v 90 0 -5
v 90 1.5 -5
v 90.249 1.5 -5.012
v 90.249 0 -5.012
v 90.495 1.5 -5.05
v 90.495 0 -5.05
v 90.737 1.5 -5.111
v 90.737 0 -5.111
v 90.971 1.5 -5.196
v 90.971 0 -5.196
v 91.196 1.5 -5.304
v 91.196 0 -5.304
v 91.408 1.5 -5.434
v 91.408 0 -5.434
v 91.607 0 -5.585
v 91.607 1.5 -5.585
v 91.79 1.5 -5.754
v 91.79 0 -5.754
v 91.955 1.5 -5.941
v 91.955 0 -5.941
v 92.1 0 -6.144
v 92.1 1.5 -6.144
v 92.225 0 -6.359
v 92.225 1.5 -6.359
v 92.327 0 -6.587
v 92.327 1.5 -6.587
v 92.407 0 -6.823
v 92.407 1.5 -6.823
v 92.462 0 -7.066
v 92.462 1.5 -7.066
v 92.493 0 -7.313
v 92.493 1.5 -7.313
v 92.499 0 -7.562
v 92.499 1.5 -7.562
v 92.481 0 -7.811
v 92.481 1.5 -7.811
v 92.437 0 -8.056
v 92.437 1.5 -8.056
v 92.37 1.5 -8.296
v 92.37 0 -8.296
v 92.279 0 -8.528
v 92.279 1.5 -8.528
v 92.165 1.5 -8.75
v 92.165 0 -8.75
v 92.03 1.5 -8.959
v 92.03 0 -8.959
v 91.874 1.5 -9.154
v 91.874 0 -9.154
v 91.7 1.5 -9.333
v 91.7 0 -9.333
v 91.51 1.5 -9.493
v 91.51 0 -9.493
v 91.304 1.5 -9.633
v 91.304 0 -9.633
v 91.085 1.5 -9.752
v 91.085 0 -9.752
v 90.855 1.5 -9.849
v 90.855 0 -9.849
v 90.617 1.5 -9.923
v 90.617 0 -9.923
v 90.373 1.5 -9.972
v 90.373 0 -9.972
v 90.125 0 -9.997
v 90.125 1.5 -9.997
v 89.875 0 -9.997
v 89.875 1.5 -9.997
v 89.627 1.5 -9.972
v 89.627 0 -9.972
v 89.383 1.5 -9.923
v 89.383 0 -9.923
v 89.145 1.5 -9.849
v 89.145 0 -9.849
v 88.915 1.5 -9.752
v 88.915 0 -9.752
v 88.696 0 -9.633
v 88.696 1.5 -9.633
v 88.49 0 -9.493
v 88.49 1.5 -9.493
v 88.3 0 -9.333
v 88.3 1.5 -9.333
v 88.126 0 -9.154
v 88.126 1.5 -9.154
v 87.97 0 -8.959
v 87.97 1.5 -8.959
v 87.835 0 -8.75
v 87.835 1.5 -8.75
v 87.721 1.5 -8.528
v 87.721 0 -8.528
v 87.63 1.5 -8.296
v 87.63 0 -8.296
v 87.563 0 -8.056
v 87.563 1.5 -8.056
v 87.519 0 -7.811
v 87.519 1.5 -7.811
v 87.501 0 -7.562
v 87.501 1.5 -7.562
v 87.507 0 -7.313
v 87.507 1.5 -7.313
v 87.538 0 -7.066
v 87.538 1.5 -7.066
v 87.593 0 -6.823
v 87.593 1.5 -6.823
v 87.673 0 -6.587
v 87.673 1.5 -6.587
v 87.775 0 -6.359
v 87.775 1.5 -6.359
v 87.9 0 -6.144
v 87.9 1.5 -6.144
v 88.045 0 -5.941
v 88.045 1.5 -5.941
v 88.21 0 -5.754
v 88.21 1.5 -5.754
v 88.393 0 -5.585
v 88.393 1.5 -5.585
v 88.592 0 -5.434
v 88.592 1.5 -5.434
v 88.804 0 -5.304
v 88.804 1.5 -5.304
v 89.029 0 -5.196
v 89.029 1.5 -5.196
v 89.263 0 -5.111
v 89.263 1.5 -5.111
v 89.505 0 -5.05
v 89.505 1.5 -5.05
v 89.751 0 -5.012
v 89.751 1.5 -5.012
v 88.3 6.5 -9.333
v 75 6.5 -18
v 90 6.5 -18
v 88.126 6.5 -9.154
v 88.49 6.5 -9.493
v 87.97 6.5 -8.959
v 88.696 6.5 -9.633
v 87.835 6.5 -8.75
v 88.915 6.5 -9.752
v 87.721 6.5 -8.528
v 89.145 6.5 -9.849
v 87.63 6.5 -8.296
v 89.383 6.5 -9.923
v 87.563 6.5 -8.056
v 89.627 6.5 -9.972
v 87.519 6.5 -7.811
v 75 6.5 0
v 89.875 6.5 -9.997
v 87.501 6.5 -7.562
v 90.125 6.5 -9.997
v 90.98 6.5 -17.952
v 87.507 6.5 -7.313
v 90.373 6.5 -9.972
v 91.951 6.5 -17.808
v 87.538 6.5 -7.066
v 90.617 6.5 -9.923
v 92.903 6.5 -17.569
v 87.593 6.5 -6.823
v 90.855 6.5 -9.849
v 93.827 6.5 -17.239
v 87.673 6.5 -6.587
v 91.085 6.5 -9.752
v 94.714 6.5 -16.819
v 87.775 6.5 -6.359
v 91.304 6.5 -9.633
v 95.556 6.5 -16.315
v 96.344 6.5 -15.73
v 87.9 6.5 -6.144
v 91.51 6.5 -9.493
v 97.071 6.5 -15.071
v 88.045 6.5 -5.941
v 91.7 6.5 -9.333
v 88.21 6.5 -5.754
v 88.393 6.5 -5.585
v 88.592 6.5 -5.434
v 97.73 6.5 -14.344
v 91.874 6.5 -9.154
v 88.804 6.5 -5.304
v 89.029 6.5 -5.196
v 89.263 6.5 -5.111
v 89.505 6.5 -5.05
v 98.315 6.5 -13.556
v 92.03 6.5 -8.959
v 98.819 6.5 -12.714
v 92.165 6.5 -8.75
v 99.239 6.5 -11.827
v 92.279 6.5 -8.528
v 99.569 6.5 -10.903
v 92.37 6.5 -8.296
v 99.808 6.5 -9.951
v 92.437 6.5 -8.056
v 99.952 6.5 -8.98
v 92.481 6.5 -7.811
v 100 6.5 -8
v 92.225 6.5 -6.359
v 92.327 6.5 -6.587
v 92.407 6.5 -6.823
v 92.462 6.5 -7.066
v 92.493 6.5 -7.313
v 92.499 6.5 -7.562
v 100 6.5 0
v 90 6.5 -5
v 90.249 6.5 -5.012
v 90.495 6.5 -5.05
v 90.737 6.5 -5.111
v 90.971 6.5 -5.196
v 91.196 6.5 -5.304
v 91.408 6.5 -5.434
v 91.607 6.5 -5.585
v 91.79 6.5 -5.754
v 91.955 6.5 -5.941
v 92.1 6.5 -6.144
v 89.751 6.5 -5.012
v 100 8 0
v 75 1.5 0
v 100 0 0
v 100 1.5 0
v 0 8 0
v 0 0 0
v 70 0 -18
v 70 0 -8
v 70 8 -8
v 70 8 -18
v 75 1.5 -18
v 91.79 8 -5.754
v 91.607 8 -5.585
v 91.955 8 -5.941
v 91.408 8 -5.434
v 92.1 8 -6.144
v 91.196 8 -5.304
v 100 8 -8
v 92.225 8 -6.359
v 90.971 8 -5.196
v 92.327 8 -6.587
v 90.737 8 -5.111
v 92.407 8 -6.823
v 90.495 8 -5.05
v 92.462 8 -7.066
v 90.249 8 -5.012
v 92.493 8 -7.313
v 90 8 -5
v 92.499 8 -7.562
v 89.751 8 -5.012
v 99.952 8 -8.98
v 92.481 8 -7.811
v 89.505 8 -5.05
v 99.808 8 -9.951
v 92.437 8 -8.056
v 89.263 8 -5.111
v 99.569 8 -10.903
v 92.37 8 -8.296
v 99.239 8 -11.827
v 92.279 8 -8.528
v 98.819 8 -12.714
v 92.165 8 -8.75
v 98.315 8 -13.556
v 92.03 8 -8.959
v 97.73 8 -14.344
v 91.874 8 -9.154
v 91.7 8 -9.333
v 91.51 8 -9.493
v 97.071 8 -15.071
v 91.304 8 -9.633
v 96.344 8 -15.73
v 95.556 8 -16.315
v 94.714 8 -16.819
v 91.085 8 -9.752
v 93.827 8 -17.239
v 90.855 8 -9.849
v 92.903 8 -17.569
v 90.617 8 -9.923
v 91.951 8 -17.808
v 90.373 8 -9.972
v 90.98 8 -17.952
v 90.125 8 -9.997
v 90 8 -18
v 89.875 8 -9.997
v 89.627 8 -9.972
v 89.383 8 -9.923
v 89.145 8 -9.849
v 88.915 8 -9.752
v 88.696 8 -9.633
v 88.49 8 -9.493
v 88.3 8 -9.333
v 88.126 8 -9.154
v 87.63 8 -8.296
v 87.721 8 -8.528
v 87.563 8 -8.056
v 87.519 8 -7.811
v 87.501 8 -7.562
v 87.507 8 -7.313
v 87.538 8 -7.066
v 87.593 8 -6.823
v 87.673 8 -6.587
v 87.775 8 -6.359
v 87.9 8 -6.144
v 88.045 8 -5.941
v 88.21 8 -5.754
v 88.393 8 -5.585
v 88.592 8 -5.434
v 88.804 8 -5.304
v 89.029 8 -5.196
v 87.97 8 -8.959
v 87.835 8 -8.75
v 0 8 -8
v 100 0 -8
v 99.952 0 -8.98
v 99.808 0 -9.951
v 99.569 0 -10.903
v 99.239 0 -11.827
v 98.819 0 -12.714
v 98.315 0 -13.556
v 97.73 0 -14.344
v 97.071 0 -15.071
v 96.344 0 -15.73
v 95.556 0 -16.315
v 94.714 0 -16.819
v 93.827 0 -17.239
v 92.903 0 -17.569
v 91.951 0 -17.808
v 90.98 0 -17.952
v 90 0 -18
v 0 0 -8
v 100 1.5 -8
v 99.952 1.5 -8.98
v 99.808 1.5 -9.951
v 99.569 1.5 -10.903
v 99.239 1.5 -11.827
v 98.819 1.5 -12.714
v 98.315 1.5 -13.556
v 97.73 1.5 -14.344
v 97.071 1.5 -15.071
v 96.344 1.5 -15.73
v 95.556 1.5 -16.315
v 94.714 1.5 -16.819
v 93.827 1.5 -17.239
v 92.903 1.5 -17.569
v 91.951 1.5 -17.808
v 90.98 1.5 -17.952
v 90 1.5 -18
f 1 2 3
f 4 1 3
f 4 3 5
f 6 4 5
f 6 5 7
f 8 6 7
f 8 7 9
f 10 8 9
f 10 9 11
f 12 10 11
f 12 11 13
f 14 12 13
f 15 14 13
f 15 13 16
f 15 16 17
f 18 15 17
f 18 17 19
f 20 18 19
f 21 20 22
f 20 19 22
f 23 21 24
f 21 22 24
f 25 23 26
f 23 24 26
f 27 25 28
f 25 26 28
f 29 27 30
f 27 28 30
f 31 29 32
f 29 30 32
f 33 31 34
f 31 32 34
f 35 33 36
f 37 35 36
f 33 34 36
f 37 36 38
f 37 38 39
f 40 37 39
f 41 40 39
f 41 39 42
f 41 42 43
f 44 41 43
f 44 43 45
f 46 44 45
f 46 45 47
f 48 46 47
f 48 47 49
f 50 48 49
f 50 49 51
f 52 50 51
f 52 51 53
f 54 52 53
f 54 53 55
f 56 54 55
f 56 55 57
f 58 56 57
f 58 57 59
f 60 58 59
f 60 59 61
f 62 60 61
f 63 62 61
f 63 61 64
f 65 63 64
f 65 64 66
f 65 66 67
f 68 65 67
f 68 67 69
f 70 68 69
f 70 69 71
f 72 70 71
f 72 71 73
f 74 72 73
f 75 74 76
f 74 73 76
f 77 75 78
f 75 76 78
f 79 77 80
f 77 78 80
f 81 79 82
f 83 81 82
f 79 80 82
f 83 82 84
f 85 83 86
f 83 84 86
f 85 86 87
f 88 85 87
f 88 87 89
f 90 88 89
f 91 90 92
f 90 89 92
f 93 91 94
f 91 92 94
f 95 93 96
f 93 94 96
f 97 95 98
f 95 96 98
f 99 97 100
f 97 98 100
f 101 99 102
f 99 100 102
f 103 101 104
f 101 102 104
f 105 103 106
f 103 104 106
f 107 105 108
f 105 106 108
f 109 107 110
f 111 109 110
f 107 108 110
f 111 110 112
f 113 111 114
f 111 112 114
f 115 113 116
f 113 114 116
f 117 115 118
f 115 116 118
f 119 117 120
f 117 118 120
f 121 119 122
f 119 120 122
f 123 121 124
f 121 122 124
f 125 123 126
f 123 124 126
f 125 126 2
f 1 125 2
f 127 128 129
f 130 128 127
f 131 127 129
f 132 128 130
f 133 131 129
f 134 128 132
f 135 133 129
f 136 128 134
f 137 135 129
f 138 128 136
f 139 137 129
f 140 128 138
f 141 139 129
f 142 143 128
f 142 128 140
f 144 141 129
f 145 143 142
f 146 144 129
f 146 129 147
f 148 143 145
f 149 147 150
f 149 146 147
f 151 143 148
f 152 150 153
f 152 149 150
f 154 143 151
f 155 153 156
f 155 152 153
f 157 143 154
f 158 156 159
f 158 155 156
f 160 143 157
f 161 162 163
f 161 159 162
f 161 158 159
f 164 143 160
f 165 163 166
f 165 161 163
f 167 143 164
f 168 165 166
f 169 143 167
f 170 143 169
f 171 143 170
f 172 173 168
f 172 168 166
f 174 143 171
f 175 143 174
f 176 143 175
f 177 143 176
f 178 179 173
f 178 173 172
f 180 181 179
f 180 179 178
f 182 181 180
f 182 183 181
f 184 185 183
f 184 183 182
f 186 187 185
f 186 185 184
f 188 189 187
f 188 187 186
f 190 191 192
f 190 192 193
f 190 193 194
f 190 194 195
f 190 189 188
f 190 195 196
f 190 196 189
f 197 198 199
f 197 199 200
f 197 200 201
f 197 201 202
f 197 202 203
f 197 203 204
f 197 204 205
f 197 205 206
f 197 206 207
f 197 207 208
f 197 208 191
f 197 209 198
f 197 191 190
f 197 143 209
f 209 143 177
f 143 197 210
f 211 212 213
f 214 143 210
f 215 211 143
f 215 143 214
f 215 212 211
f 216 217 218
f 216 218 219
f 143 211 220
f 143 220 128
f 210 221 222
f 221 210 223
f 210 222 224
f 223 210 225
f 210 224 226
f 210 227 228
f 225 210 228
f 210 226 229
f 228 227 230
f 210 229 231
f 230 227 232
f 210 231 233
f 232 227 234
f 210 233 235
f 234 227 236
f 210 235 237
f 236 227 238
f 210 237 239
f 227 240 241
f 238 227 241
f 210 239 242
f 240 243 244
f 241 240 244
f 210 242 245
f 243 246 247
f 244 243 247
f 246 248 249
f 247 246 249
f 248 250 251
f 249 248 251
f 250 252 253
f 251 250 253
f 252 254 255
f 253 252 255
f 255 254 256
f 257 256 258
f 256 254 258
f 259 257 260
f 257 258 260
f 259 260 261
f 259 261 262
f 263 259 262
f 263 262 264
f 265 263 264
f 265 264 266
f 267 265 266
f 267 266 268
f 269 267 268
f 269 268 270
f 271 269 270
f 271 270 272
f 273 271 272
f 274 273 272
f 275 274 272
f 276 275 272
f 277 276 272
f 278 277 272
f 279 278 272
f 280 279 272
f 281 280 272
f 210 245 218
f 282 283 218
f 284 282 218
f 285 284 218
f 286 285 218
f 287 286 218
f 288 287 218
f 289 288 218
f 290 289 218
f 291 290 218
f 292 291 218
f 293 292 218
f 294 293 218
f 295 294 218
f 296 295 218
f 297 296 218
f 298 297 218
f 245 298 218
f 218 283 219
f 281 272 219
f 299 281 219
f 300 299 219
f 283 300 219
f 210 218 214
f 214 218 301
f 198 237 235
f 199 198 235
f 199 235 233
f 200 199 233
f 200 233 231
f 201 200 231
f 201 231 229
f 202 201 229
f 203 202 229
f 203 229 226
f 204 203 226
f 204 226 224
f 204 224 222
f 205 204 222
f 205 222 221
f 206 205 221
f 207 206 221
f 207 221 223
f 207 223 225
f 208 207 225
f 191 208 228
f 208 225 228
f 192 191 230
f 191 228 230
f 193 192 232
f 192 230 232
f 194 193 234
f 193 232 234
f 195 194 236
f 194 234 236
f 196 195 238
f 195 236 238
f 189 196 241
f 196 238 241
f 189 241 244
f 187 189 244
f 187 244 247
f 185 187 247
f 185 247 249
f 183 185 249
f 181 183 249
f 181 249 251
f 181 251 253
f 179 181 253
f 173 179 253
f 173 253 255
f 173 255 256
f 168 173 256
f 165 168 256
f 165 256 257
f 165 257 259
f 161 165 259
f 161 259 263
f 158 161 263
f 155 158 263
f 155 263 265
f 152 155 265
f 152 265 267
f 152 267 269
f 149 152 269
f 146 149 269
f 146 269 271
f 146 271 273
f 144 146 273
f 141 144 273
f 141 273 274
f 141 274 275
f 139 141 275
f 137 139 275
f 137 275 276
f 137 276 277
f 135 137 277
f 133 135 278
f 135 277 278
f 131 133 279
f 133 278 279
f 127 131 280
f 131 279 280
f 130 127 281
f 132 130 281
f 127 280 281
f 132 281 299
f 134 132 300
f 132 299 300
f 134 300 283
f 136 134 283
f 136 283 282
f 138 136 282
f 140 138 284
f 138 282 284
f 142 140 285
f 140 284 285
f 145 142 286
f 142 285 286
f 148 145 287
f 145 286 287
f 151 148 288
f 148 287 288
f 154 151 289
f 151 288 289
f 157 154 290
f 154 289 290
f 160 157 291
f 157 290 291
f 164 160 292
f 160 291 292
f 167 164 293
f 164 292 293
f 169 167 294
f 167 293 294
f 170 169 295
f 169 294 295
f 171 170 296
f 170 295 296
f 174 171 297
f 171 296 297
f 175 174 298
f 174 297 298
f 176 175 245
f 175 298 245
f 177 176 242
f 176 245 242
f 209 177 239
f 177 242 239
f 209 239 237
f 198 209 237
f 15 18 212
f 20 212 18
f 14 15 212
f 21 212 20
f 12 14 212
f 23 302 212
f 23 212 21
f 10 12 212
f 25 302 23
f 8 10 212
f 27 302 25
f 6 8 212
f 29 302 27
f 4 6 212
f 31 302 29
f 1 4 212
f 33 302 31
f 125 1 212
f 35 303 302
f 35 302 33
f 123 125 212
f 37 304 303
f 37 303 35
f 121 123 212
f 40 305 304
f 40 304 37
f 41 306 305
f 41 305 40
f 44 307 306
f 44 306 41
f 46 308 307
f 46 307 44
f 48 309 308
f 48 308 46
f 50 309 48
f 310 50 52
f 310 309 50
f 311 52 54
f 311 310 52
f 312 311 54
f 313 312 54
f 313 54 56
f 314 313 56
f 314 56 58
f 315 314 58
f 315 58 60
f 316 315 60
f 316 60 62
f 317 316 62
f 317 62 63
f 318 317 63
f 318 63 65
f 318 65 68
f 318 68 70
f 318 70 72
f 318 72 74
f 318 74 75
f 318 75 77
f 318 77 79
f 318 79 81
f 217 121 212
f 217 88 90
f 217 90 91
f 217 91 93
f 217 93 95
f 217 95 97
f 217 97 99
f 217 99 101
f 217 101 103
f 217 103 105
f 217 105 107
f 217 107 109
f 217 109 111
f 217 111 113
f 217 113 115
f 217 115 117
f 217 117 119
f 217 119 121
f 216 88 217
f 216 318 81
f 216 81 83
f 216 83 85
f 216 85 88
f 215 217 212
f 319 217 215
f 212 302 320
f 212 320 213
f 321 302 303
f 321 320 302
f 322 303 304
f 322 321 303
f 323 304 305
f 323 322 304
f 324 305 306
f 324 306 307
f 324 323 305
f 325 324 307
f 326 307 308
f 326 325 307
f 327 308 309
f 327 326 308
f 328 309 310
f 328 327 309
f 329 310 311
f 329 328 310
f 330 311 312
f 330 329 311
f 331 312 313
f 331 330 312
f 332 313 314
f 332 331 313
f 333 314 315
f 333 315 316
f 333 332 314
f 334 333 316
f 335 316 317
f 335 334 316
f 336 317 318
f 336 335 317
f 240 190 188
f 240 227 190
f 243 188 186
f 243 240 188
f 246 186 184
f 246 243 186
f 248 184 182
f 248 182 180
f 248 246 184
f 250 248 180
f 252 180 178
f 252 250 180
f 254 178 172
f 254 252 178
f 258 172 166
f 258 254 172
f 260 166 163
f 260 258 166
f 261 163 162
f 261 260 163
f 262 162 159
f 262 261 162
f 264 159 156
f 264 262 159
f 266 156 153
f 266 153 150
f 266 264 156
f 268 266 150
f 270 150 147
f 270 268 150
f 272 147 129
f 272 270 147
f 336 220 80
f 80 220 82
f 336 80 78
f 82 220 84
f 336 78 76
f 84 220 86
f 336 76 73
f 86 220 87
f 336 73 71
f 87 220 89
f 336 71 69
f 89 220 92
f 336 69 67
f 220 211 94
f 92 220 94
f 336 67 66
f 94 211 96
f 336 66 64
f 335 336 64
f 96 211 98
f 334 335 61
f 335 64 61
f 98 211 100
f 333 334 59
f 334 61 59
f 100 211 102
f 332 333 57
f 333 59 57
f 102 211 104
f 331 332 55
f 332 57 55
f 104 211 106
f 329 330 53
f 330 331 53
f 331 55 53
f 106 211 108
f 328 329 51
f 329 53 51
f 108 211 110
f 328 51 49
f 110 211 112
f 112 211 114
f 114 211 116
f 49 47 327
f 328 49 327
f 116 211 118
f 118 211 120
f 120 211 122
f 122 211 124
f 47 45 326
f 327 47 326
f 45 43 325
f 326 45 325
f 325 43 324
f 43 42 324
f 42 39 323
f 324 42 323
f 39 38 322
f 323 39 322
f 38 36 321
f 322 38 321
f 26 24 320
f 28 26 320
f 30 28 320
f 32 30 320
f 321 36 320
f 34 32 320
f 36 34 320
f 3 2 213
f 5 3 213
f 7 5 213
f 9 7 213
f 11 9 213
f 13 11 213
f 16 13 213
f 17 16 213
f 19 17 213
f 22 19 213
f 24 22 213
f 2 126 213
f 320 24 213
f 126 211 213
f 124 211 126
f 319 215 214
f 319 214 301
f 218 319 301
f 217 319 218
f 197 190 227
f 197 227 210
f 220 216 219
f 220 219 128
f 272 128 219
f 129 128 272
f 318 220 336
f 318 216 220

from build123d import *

# Parameters (mm, degrees)
BOSS_EXTRUDE1_DEPTH = 8
SKETCH2_W           = 25
SKETCH2_H           = 5
CUT_EXTRUDE1_DEPTH  = 35
SKETCH3_R           = 2.5
CUT_EXTRUDE2_DEPTH  = 35
FILLET1_R           = 10


with BuildPart() as part:
    # Sketch1 → Boss-Extrude1 (new body)
    with BuildSketch(Plane(origin=(0, 0, 0), x_dir=(1, 0, 0), z_dir=(0, 1, 0))):
        Polygon((0, 0), (0, 8), (70, 8), (70, 18), (100, 18), (100, 0), align=None)
    extrude(amount=BOSS_EXTRUDE1_DEPTH)

    # Sketch2 → Cut-Extrude1 (cut)
    with BuildSketch(Plane.XY):
        with Locations((87.5, 4)):
            Rectangle(SKETCH2_W, SKETCH2_H)
    extrude(amount=-CUT_EXTRUDE1_DEPTH, mode=Mode.SUBTRACT)

    # Sketch3 → Cut-Extrude2 (cut)
    with BuildSketch(Plane(origin=(0, 8, 0), x_dir=(1, 0, 0), z_dir=(0, 1, 0))):
        with Locations(Location((90, 7.5, 0), (0, 0, 270))):
            Circle(SKETCH3_R)
    extrude(amount=-CUT_EXTRUDE2_DEPTH, mode=Mode.SUBTRACT)

    # Fillet1
    fillet1_edges = [part.edges().sort_by_distance(p)[0] for p in [
        (100, 7.25, -18),
        (100, 0.75, -18),
    ]]
    fillet(fillet1_edges, radius=FILLET1_R)


solid = part.part
